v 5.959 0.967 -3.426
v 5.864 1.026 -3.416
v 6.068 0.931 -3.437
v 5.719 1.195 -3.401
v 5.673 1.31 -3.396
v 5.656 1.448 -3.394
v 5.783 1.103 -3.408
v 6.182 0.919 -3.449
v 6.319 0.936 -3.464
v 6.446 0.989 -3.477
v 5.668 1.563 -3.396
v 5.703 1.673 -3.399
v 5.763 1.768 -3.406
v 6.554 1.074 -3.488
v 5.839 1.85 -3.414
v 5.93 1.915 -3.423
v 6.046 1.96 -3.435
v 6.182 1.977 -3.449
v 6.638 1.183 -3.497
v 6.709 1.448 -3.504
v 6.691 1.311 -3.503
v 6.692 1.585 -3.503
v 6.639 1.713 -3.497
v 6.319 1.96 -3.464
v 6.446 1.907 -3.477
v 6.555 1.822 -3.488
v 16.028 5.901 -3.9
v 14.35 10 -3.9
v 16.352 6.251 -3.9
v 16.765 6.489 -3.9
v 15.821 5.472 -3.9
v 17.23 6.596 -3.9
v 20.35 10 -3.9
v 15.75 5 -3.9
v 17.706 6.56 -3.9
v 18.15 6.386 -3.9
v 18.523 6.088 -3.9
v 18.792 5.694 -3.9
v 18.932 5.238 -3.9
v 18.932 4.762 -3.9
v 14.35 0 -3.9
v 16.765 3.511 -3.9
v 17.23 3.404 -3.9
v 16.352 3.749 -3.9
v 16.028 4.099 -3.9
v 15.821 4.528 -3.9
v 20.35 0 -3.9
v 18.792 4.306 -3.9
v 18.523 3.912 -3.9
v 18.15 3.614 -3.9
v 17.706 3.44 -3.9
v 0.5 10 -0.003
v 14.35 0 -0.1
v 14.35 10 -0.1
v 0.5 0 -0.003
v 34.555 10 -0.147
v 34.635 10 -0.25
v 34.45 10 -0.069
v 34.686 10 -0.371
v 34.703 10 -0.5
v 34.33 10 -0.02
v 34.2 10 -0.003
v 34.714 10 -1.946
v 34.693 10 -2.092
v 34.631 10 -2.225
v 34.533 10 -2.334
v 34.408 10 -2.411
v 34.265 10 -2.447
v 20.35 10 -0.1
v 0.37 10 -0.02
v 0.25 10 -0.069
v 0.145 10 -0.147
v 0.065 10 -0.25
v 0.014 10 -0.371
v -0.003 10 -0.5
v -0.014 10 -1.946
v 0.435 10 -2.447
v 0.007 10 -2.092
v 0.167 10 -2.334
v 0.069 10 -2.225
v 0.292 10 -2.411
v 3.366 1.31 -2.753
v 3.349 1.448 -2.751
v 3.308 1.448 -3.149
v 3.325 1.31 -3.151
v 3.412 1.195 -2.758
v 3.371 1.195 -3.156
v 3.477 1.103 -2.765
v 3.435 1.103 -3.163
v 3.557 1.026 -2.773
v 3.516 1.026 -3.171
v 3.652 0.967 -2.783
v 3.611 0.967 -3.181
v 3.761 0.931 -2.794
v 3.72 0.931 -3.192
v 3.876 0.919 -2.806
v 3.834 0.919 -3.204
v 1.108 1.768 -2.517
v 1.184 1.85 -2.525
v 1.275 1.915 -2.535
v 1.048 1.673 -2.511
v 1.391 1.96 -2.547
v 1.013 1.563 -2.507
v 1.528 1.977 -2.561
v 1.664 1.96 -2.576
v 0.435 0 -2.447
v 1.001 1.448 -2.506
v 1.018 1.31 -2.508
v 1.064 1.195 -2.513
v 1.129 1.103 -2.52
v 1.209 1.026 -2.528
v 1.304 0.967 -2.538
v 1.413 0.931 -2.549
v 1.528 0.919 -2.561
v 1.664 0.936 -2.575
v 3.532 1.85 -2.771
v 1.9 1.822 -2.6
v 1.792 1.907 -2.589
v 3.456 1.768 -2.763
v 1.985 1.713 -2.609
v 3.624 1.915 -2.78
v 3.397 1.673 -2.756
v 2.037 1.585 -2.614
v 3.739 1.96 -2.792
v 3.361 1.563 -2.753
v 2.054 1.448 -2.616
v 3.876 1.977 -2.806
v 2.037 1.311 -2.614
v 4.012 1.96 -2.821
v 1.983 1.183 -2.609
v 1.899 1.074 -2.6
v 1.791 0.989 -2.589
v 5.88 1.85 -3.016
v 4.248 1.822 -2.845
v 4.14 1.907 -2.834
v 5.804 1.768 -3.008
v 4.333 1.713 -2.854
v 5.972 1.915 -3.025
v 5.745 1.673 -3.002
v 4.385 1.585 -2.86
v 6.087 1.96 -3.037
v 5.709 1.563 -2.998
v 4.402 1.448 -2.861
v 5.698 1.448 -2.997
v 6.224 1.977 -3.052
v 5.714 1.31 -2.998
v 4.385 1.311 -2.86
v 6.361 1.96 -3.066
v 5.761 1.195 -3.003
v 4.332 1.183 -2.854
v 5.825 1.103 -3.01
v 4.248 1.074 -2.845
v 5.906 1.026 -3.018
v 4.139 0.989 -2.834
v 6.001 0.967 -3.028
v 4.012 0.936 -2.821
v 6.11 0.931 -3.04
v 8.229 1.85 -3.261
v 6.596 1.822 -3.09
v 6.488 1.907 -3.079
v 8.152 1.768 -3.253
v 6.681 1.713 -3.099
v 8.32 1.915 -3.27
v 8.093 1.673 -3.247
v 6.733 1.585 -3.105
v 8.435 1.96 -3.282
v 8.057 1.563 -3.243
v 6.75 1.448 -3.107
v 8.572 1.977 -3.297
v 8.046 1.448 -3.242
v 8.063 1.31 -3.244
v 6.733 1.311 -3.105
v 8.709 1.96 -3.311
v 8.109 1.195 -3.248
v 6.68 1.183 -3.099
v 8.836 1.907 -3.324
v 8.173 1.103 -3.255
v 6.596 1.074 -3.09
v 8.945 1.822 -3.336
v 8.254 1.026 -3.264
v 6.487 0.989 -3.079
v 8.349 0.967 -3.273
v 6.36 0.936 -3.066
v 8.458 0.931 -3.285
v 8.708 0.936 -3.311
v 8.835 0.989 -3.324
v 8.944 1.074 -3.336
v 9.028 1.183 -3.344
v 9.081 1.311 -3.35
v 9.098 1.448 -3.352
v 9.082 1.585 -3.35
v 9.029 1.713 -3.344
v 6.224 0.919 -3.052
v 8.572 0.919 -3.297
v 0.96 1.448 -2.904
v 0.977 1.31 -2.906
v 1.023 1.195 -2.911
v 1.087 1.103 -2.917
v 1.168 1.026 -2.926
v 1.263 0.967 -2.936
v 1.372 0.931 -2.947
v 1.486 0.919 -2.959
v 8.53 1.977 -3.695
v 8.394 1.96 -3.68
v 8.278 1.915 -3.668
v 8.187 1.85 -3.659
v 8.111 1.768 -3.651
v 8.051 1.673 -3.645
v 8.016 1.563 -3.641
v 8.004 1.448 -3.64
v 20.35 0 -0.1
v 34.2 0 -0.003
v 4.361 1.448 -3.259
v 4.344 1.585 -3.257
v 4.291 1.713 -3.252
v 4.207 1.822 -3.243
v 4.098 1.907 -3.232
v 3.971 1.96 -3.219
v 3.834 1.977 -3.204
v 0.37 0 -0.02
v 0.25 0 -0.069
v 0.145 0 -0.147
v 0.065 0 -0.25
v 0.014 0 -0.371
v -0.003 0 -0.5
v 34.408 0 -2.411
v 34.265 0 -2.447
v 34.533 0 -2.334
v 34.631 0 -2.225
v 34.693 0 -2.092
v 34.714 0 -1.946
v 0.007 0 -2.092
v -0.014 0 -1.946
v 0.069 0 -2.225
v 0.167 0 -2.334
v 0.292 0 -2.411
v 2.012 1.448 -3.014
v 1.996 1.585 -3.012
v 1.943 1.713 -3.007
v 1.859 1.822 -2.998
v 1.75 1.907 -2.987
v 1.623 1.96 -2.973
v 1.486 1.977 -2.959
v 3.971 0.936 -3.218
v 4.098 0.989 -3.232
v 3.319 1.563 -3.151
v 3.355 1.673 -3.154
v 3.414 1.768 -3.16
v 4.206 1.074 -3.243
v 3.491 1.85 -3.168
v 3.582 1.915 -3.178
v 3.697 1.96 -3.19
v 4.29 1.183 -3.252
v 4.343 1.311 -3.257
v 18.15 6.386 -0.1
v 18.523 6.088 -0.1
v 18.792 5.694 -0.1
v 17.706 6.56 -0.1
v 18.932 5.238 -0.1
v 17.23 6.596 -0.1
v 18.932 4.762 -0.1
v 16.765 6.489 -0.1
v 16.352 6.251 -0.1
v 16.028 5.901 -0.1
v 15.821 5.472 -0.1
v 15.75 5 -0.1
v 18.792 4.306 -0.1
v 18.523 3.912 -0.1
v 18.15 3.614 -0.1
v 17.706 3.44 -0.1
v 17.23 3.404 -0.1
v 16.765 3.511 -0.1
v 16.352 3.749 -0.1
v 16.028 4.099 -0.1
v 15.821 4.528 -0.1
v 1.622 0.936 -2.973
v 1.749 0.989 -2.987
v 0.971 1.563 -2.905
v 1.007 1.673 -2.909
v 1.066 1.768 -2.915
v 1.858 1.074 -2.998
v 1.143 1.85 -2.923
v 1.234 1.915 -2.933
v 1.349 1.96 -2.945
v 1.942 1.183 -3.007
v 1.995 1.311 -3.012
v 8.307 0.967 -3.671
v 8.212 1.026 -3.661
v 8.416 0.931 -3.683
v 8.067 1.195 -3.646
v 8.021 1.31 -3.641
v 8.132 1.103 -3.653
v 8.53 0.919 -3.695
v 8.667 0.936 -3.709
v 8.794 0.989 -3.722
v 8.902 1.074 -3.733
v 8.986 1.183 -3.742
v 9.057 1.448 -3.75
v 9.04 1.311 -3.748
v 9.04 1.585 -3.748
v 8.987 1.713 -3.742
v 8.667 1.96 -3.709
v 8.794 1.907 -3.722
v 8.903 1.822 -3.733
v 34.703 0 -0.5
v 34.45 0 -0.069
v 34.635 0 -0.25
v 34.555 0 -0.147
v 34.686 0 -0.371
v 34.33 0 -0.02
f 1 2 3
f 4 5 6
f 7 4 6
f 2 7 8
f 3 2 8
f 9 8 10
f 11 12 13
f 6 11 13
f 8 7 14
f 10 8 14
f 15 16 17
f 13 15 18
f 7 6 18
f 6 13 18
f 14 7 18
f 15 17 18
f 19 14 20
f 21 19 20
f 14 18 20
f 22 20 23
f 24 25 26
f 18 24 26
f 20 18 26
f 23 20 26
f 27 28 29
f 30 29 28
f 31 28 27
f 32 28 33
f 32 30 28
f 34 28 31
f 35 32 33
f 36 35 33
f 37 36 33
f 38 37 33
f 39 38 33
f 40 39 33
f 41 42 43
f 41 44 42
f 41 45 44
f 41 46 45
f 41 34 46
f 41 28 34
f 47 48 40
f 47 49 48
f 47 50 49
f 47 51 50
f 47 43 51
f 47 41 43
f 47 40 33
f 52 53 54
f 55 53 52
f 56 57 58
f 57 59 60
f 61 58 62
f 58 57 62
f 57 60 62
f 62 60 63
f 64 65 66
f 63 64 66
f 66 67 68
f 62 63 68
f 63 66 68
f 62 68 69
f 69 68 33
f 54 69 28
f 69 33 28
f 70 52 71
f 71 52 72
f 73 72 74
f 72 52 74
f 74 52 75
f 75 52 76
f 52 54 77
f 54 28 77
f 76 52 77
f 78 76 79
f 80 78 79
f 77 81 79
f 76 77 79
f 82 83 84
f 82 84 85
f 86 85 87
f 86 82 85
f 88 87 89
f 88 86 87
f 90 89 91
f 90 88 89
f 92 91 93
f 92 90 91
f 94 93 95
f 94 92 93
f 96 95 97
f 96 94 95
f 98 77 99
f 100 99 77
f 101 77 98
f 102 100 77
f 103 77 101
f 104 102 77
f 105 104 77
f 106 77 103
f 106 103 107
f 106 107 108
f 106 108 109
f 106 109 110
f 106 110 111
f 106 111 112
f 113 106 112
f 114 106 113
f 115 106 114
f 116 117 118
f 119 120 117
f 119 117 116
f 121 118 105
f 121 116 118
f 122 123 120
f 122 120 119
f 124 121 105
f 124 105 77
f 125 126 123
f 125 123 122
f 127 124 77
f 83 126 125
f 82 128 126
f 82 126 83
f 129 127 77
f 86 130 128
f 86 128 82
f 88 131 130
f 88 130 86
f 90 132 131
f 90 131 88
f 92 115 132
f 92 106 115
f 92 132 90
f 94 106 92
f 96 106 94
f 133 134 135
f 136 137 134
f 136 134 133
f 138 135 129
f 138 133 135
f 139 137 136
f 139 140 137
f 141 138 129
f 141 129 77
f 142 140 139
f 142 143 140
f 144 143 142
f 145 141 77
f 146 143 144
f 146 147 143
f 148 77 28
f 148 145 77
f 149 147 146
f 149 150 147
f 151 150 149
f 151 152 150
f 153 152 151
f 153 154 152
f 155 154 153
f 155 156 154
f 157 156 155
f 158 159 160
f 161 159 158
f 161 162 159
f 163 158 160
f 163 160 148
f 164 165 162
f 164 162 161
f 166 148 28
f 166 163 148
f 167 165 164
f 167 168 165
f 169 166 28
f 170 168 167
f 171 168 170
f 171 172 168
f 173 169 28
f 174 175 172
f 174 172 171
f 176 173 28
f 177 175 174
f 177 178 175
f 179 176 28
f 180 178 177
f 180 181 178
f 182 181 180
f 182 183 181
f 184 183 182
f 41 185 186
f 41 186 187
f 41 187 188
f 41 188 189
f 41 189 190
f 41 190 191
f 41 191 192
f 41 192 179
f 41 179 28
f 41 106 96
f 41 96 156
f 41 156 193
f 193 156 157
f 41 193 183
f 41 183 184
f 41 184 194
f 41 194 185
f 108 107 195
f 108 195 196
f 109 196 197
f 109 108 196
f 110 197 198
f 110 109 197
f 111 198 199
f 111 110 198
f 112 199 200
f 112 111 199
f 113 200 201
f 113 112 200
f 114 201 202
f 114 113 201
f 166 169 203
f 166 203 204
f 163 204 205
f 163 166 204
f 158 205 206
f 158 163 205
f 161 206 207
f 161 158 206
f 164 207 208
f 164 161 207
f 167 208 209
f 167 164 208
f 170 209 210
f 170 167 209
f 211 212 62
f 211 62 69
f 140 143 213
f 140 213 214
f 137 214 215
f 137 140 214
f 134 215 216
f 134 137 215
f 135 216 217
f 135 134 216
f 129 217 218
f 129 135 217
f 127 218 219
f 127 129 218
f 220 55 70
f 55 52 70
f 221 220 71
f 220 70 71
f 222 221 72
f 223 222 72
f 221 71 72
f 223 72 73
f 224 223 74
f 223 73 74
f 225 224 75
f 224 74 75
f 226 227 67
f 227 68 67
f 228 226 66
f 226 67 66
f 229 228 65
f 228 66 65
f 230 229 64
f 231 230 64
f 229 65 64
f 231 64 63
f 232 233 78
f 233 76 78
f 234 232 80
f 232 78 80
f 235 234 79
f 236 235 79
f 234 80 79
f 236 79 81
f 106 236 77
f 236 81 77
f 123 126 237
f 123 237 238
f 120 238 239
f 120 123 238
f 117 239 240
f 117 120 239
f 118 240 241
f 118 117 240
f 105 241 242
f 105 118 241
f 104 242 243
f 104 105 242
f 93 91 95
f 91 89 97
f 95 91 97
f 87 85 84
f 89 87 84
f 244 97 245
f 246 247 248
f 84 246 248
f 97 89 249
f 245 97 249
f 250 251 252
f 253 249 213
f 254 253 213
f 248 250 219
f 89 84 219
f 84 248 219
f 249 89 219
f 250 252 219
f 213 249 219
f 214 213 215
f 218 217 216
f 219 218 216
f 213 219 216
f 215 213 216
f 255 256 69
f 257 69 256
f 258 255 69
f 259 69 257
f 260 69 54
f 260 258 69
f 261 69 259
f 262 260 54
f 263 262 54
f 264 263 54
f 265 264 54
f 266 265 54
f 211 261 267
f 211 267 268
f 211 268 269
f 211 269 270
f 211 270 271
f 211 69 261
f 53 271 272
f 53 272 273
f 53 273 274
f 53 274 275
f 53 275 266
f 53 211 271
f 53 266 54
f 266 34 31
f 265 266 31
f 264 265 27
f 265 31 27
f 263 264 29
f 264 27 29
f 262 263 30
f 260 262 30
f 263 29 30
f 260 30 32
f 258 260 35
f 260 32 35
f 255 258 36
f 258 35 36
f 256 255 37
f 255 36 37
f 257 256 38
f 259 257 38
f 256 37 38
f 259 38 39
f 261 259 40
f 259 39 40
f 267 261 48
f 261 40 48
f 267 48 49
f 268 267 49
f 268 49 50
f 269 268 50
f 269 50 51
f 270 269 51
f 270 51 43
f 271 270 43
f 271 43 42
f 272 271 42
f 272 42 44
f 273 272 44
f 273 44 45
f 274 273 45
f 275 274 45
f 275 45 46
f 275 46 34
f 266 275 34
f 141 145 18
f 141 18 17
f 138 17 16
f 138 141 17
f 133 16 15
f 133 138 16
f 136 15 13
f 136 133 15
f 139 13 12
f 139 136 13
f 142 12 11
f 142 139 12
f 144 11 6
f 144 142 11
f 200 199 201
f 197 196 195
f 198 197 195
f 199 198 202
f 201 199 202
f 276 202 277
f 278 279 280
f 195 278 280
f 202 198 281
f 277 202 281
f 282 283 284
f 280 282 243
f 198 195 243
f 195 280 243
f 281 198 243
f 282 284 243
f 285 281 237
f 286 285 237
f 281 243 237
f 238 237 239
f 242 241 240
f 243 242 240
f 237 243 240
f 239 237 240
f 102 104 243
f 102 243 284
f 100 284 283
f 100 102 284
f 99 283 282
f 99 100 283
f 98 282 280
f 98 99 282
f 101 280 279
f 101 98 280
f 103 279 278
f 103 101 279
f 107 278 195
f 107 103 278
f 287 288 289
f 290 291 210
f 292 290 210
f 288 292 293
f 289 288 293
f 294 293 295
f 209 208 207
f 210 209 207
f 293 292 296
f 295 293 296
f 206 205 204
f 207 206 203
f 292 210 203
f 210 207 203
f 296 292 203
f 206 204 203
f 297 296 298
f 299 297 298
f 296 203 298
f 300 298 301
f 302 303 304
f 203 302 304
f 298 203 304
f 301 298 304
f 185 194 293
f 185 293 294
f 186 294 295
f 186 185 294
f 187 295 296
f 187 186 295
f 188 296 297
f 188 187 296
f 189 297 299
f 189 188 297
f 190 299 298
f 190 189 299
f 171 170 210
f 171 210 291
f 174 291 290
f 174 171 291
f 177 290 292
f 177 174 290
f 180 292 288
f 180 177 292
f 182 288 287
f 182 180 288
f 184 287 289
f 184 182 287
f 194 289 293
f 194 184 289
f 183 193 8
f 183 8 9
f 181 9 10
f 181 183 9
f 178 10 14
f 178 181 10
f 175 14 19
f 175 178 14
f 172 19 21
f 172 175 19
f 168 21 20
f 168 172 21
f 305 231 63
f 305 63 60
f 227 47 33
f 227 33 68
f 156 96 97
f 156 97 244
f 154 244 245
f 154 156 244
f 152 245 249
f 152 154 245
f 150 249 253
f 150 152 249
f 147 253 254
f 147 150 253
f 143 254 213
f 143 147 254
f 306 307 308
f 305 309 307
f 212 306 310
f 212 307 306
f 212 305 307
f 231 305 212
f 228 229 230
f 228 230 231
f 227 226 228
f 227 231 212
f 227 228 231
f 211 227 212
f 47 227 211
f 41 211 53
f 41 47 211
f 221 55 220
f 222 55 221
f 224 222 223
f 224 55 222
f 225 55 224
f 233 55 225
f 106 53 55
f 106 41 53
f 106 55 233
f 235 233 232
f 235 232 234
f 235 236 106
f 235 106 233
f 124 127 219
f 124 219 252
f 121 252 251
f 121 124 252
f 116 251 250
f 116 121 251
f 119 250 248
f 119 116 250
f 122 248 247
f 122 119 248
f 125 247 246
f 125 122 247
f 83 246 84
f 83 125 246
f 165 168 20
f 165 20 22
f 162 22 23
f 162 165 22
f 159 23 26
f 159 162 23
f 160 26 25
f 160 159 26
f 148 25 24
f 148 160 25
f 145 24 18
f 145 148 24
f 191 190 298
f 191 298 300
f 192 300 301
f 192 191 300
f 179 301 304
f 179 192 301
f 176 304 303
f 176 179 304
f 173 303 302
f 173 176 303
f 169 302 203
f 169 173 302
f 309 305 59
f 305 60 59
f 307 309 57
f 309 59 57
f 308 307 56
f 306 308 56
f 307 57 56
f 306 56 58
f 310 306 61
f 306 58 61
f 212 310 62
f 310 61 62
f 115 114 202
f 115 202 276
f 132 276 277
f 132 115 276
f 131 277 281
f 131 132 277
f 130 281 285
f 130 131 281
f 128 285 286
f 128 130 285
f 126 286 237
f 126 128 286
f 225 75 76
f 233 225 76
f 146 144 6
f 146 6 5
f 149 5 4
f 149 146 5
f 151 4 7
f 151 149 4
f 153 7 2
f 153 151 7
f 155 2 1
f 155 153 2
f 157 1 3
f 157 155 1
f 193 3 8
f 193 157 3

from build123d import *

# Parameters (mm, degrees)
BOSS_EXTRUDE1_DEPTH       = 10
FILLET2_R                 = 0.5
SKETCH2_R                 = 1.6
CUT_EXTRUDE1_DEPTH        = 4.896527904
REVISION_INDICATION_DEPTH = 0.4


with BuildPart() as part:
    # Sketch1 → Boss-Extrude1 (new body)
    with BuildSketch(Plane(origin=(0, 0, 0), x_dir=(1, 0, 0), z_dir=(0, 1, 0))):
        Polygon((20.35, 0.1), (14.35, 0.1), (0, 0), (-0.016724739, 2.4), (14.35, 3.9), (20.35, 3.9), (34.716724739, 2.4), (34.7, 0), align=None)
    extrude(amount=BOSS_EXTRUDE1_DEPTH)

    # Fillet2
    fillet2_edges = [part.edges().sort_by_distance(p)[0] for p in [
        (-0.016724739, 5, -2.4),
        (34.716724739, 5, -2.4),
        (34.7, 5, 0),
        (0, 5, 0),
    ]]
    fillet(fillet2_edges, radius=FILLET2_R)

    # Sketch2 → Cut-Extrude1 (cut, through all)
    with BuildSketch(Plane(origin=(0, 0, -3.9), x_dir=(-1, 0, 0), z_dir=(0, 0, -1))):
        with Locations((-17.35, 5)):
            Circle(SKETCH2_R)
    extrude(amount=-CUT_EXTRUDE1_DEPTH, mode=Mode.SUBTRACT)

    # Sketch5 → revision indication (add)
    with BuildSketch(Plane(origin=(-0.248057274, 0, -2.375847049), x_dir=(-0.994593653, 0, 0.103843465), z_dir=(-0.103843465, 0, -0.994593653))):
        with BuildLine():
            add(Edge.make_bspline(
                [(-1.785308798, 1.976923077), (-1.749947985, 1.974821832), (-1.680627244, 1.970702586), (-1.580407683, 1.942442049), (-1.489703086, 1.892261337), (-1.40890887, 1.825381725), (-1.342312834, 1.744291021), (-1.290343795, 1.654309873), (-1.262329436, 1.553251269), (-1.258240196, 1.483528859), (-1.256142132, 1.44775641)],
                knots=[0, 0, 0, 0, 0.000106068, 0.000207934, 0.000309251, 0.000414952, 0.000520654, 0.000622584, 0.00072445, 0.000831784, 0.000831784, 0.000831784, 0.000831784], degree=3))
            add(Edge.make_bspline(
                [(-1.256142132, 1.44775641), (-1.258311293, 1.412843512), (-1.262588847, 1.343995789), (-1.290279579, 1.243699421), (-1.342708899, 1.153662038), (-1.408449529, 1.071471016), (-1.489723058, 1.004449722), (-1.580622123, 0.954695939), (-1.680391977, 0.924411918), (-1.749908735, 0.920554208), (-1.785308798, 0.918589744)],
                knots=[0, 0, 0, 0, 0.000104802, 0.000206668, 0.000308598, 0.000415282, 0.000520984, 0.0006223, 0.000724523, 0.000830591, 0.000830591, 0.000830591, 0.000830591], degree=3))
            add(Edge.make_bspline(
                [(-1.785308798, 0.918589744), (-1.82073437, 0.920483127), (-1.889894366, 0.924179507), (-1.989291812, 0.955317742), (-2.080744455, 1.003983162), (-2.162002161, 1.071595984), (-2.228293388, 1.153239101), (-2.278413725, 1.244319503), (-2.308512996, 1.343708683), (-2.312471536, 1.412786963), (-2.314475465, 1.44775641)],
                knots=[0, 0, 0, 0, 0.000106068, 0.000207073, 0.000309509, 0.000415211, 0.000521895, 0.000623212, 0.000725435, 0.000830237, 0.000830237, 0.000830237, 0.000830237], degree=3))
            add(Edge.make_bspline(
                [(-2.314475465, 1.44775641), (-2.312548513, 1.483587428), (-2.308786377, 1.553543092), (-2.278350536, 1.653690044), (-2.228682266, 1.744709926), (-2.161543907, 1.825258007), (-2.080764113, 1.892726399), (-1.989512426, 1.941829667), (-1.889654975, 1.970931558), (-1.820694086, 1.974891267), (-1.785308798, 1.976923077)],
                knots=[0, 0, 0, 0, 0.000107334, 0.000209557, 0.000310874, 0.000416575, 0.000522277, 0.000624713, 0.000725357, 0.000831425, 0.000831425, 0.000831425, 0.000831425], degree=3))
        make_face()
        with BuildLine():
            add(Edge.make_bspline(
                [(-4.146206234, 1.976923077), (-4.110845421, 1.974821832), (-4.04152468, 1.970702586), (-3.941305118, 1.942442049), (-3.850600522, 1.892261337), (-3.769806306, 1.825381725), (-3.70321027, 1.744291021), (-3.651241231, 1.654309873), (-3.623226872, 1.553251269), (-3.619137632, 1.483528859), (-3.617039568, 1.44775641)],
                knots=[0, 0, 0, 0, 0.000106068, 0.000207934, 0.000309251, 0.000414952, 0.000520654, 0.000622584, 0.00072445, 0.000831784, 0.000831784, 0.000831784, 0.000831784], degree=3))
            add(Edge.make_bspline(
                [(-3.617039568, 1.44775641), (-3.619208729, 1.412843512), (-3.623486283, 1.343995789), (-3.651177015, 1.243699421), (-3.703606335, 1.153662038), (-3.769346965, 1.071471016), (-3.850620494, 1.004449722), (-3.941519559, 0.954695939), (-4.041289413, 0.924411918), (-4.110806171, 0.920554208), (-4.146206234, 0.918589744)],
                knots=[0, 0, 0, 0, 0.000104802, 0.000206668, 0.000308598, 0.000415282, 0.000520984, 0.0006223, 0.000724523, 0.000830591, 0.000830591, 0.000830591, 0.000830591], degree=3))
            add(Edge.make_bspline(
                [(-4.146206234, 0.918589744), (-4.181631806, 0.920483127), (-4.250791802, 0.924179507), (-4.350189248, 0.955317742), (-4.441641891, 1.003983162), (-4.522899597, 1.071595984), (-4.589190824, 1.153239101), (-4.639311161, 1.244319503), (-4.669410431, 1.343708683), (-4.673368972, 1.412786963), (-4.675372901, 1.44775641)],
                knots=[0, 0, 0, 0, 0.000106068, 0.000207073, 0.000309509, 0.000415211, 0.000521895, 0.000623212, 0.000725435, 0.000830237, 0.000830237, 0.000830237, 0.000830237], degree=3))
            add(Edge.make_bspline(
                [(-4.675372901, 1.44775641), (-4.673445949, 1.483587428), (-4.669683813, 1.553543092), (-4.639247972, 1.653690044), (-4.589579702, 1.744709926), (-4.522441343, 1.825258007), (-4.441661549, 1.892726399), (-4.350409862, 1.941829667), (-4.25055241, 1.970931558), (-4.181591522, 1.974891267), (-4.146206234, 1.976923077)],
                knots=[0, 0, 0, 0, 0.000107334, 0.000209557, 0.000310874, 0.000416575, 0.000522277, 0.000624713, 0.000725357, 0.000831425, 0.000831425, 0.000831425, 0.000831425], degree=3))
        make_face()
        with BuildLine():
            add(Edge.make_bspline(
                [(-6.50710367, 1.976923077), (-6.471742857, 1.974821832), (-6.402422116, 1.970702586), (-6.302202554, 1.942442049), (-6.211497957, 1.892261337), (-6.130703742, 1.825381725), (-6.064107706, 1.744291021), (-6.012138667, 1.654309873), (-5.984124308, 1.553251269), (-5.980035068, 1.483528859), (-5.977937003, 1.44775641)],
                knots=[0, 0, 0, 0, 0.000106068, 0.000207934, 0.000309251, 0.000414952, 0.000520654, 0.000622584, 0.00072445, 0.000831784, 0.000831784, 0.000831784, 0.000831784], degree=3))
            add(Edge.make_bspline(
                [(-5.977937003, 1.44775641), (-5.980106165, 1.412843512), (-5.984383719, 1.343995789), (-6.012074451, 1.243699421), (-6.064503771, 1.153662038), (-6.130244401, 1.071471016), (-6.21151793, 1.004449722), (-6.302416994, 0.954695939), (-6.402186849, 0.924411918), (-6.471703607, 0.920554208), (-6.50710367, 0.918589744)],
                knots=[0, 0, 0, 0, 0.000104802, 0.000206668, 0.000308598, 0.000415282, 0.000520984, 0.0006223, 0.000724523, 0.000830591, 0.000830591, 0.000830591, 0.000830591], degree=3))
            add(Edge.make_bspline(
                [(-6.50710367, 0.918589744), (-6.542529242, 0.920483127), (-6.611689237, 0.924179507), (-6.711086684, 0.955317742), (-6.802539327, 1.003983162), (-6.883797033, 1.071595984), (-6.95008826, 1.153239101), (-7.000208597, 1.244319503), (-7.030307867, 1.343708683), (-7.034266408, 1.412786963), (-7.036270337, 1.44775641)],
                knots=[0, 0, 0, 0, 0.000106068, 0.000207073, 0.000309509, 0.000415211, 0.000521895, 0.000623212, 0.000725435, 0.000830237, 0.000830237, 0.000830237, 0.000830237], degree=3))
            add(Edge.make_bspline(
                [(-7.036270337, 1.44775641), (-7.034343385, 1.483587428), (-7.030581249, 1.553543092), (-7.000145408, 1.653690044), (-6.950477138, 1.744709926), (-6.883338779, 1.825258007), (-6.802558985, 1.892726399), (-6.711307298, 1.941829667), (-6.611449846, 1.970931558), (-6.542488958, 1.974891267), (-6.50710367, 1.976923077)],
                knots=[0, 0, 0, 0, 0.000107334, 0.000209557, 0.000310874, 0.000416575, 0.000522277, 0.000624713, 0.000725357, 0.000831425, 0.000831425, 0.000831425, 0.000831425], degree=3))
        make_face()
        with BuildLine():
            add(Edge.make_bspline(
                [(-8.868001106, 1.976923077), (-8.832640293, 1.974821832), (-8.763319552, 1.970702586), (-8.66309999, 1.942442049), (-8.572395393, 1.892261337), (-8.491601178, 1.825381725), (-8.425005142, 1.744291021), (-8.373036103, 1.654309873), (-8.345021744, 1.553251269), (-8.340932504, 1.483528859), (-8.338834439, 1.44775641)],
                knots=[0, 0, 0, 0, 0.000106068, 0.000207934, 0.000309251, 0.000414952, 0.000520654, 0.000622584, 0.00072445, 0.000831784, 0.000831784, 0.000831784, 0.000831784], degree=3))
            add(Edge.make_bspline(
                [(-8.338834439, 1.44775641), (-8.341003601, 1.412843512), (-8.345281155, 1.343995789), (-8.372971887, 1.243699421), (-8.425401207, 1.153662038), (-8.491141837, 1.071471016), (-8.572415366, 1.004449722), (-8.66331443, 0.954695939), (-8.763084284, 0.924411918), (-8.832601042, 0.920554208), (-8.868001106, 0.918589744)],
                knots=[0, 0, 0, 0, 0.000104802, 0.000206668, 0.000308598, 0.000415282, 0.000520984, 0.0006223, 0.000724523, 0.000830591, 0.000830591, 0.000830591, 0.000830591], degree=3))
            add(Edge.make_bspline(
                [(-8.868001106, 0.918589744), (-8.903426678, 0.920483127), (-8.972586673, 0.924179507), (-9.07198412, 0.955317742), (-9.163436763, 1.003983162), (-9.244694469, 1.071595984), (-9.310985696, 1.153239101), (-9.361106033, 1.244319503), (-9.391205303, 1.343708683), (-9.395163844, 1.412786963), (-9.397167773, 1.44775641)],
                knots=[0, 0, 0, 0, 0.000106068, 0.000207073, 0.000309509, 0.000415211, 0.000521895, 0.000623212, 0.000725435, 0.000830237, 0.000830237, 0.000830237, 0.000830237], degree=3))
            add(Edge.make_bspline(
                [(-9.397167773, 1.44775641), (-9.395240821, 1.483587428), (-9.391478685, 1.553543092), (-9.361042844, 1.653690044), (-9.311374574, 1.744709926), (-9.244236214, 1.825258007), (-9.16345642, 1.892726399), (-9.072204734, 1.941829667), (-8.972347282, 1.970931558), (-8.903386394, 1.974891267), (-8.868001106, 1.976923077)],
                knots=[0, 0, 0, 0, 0.000107334, 0.000209557, 0.000310874, 0.000416575, 0.000522277, 0.000624713, 0.000725357, 0.000831425, 0.000831425, 0.000831425, 0.000831425], degree=3))
        make_face()
    extrude(amount=REVISION_INDICATION_DEPTH)


solid = part.part
